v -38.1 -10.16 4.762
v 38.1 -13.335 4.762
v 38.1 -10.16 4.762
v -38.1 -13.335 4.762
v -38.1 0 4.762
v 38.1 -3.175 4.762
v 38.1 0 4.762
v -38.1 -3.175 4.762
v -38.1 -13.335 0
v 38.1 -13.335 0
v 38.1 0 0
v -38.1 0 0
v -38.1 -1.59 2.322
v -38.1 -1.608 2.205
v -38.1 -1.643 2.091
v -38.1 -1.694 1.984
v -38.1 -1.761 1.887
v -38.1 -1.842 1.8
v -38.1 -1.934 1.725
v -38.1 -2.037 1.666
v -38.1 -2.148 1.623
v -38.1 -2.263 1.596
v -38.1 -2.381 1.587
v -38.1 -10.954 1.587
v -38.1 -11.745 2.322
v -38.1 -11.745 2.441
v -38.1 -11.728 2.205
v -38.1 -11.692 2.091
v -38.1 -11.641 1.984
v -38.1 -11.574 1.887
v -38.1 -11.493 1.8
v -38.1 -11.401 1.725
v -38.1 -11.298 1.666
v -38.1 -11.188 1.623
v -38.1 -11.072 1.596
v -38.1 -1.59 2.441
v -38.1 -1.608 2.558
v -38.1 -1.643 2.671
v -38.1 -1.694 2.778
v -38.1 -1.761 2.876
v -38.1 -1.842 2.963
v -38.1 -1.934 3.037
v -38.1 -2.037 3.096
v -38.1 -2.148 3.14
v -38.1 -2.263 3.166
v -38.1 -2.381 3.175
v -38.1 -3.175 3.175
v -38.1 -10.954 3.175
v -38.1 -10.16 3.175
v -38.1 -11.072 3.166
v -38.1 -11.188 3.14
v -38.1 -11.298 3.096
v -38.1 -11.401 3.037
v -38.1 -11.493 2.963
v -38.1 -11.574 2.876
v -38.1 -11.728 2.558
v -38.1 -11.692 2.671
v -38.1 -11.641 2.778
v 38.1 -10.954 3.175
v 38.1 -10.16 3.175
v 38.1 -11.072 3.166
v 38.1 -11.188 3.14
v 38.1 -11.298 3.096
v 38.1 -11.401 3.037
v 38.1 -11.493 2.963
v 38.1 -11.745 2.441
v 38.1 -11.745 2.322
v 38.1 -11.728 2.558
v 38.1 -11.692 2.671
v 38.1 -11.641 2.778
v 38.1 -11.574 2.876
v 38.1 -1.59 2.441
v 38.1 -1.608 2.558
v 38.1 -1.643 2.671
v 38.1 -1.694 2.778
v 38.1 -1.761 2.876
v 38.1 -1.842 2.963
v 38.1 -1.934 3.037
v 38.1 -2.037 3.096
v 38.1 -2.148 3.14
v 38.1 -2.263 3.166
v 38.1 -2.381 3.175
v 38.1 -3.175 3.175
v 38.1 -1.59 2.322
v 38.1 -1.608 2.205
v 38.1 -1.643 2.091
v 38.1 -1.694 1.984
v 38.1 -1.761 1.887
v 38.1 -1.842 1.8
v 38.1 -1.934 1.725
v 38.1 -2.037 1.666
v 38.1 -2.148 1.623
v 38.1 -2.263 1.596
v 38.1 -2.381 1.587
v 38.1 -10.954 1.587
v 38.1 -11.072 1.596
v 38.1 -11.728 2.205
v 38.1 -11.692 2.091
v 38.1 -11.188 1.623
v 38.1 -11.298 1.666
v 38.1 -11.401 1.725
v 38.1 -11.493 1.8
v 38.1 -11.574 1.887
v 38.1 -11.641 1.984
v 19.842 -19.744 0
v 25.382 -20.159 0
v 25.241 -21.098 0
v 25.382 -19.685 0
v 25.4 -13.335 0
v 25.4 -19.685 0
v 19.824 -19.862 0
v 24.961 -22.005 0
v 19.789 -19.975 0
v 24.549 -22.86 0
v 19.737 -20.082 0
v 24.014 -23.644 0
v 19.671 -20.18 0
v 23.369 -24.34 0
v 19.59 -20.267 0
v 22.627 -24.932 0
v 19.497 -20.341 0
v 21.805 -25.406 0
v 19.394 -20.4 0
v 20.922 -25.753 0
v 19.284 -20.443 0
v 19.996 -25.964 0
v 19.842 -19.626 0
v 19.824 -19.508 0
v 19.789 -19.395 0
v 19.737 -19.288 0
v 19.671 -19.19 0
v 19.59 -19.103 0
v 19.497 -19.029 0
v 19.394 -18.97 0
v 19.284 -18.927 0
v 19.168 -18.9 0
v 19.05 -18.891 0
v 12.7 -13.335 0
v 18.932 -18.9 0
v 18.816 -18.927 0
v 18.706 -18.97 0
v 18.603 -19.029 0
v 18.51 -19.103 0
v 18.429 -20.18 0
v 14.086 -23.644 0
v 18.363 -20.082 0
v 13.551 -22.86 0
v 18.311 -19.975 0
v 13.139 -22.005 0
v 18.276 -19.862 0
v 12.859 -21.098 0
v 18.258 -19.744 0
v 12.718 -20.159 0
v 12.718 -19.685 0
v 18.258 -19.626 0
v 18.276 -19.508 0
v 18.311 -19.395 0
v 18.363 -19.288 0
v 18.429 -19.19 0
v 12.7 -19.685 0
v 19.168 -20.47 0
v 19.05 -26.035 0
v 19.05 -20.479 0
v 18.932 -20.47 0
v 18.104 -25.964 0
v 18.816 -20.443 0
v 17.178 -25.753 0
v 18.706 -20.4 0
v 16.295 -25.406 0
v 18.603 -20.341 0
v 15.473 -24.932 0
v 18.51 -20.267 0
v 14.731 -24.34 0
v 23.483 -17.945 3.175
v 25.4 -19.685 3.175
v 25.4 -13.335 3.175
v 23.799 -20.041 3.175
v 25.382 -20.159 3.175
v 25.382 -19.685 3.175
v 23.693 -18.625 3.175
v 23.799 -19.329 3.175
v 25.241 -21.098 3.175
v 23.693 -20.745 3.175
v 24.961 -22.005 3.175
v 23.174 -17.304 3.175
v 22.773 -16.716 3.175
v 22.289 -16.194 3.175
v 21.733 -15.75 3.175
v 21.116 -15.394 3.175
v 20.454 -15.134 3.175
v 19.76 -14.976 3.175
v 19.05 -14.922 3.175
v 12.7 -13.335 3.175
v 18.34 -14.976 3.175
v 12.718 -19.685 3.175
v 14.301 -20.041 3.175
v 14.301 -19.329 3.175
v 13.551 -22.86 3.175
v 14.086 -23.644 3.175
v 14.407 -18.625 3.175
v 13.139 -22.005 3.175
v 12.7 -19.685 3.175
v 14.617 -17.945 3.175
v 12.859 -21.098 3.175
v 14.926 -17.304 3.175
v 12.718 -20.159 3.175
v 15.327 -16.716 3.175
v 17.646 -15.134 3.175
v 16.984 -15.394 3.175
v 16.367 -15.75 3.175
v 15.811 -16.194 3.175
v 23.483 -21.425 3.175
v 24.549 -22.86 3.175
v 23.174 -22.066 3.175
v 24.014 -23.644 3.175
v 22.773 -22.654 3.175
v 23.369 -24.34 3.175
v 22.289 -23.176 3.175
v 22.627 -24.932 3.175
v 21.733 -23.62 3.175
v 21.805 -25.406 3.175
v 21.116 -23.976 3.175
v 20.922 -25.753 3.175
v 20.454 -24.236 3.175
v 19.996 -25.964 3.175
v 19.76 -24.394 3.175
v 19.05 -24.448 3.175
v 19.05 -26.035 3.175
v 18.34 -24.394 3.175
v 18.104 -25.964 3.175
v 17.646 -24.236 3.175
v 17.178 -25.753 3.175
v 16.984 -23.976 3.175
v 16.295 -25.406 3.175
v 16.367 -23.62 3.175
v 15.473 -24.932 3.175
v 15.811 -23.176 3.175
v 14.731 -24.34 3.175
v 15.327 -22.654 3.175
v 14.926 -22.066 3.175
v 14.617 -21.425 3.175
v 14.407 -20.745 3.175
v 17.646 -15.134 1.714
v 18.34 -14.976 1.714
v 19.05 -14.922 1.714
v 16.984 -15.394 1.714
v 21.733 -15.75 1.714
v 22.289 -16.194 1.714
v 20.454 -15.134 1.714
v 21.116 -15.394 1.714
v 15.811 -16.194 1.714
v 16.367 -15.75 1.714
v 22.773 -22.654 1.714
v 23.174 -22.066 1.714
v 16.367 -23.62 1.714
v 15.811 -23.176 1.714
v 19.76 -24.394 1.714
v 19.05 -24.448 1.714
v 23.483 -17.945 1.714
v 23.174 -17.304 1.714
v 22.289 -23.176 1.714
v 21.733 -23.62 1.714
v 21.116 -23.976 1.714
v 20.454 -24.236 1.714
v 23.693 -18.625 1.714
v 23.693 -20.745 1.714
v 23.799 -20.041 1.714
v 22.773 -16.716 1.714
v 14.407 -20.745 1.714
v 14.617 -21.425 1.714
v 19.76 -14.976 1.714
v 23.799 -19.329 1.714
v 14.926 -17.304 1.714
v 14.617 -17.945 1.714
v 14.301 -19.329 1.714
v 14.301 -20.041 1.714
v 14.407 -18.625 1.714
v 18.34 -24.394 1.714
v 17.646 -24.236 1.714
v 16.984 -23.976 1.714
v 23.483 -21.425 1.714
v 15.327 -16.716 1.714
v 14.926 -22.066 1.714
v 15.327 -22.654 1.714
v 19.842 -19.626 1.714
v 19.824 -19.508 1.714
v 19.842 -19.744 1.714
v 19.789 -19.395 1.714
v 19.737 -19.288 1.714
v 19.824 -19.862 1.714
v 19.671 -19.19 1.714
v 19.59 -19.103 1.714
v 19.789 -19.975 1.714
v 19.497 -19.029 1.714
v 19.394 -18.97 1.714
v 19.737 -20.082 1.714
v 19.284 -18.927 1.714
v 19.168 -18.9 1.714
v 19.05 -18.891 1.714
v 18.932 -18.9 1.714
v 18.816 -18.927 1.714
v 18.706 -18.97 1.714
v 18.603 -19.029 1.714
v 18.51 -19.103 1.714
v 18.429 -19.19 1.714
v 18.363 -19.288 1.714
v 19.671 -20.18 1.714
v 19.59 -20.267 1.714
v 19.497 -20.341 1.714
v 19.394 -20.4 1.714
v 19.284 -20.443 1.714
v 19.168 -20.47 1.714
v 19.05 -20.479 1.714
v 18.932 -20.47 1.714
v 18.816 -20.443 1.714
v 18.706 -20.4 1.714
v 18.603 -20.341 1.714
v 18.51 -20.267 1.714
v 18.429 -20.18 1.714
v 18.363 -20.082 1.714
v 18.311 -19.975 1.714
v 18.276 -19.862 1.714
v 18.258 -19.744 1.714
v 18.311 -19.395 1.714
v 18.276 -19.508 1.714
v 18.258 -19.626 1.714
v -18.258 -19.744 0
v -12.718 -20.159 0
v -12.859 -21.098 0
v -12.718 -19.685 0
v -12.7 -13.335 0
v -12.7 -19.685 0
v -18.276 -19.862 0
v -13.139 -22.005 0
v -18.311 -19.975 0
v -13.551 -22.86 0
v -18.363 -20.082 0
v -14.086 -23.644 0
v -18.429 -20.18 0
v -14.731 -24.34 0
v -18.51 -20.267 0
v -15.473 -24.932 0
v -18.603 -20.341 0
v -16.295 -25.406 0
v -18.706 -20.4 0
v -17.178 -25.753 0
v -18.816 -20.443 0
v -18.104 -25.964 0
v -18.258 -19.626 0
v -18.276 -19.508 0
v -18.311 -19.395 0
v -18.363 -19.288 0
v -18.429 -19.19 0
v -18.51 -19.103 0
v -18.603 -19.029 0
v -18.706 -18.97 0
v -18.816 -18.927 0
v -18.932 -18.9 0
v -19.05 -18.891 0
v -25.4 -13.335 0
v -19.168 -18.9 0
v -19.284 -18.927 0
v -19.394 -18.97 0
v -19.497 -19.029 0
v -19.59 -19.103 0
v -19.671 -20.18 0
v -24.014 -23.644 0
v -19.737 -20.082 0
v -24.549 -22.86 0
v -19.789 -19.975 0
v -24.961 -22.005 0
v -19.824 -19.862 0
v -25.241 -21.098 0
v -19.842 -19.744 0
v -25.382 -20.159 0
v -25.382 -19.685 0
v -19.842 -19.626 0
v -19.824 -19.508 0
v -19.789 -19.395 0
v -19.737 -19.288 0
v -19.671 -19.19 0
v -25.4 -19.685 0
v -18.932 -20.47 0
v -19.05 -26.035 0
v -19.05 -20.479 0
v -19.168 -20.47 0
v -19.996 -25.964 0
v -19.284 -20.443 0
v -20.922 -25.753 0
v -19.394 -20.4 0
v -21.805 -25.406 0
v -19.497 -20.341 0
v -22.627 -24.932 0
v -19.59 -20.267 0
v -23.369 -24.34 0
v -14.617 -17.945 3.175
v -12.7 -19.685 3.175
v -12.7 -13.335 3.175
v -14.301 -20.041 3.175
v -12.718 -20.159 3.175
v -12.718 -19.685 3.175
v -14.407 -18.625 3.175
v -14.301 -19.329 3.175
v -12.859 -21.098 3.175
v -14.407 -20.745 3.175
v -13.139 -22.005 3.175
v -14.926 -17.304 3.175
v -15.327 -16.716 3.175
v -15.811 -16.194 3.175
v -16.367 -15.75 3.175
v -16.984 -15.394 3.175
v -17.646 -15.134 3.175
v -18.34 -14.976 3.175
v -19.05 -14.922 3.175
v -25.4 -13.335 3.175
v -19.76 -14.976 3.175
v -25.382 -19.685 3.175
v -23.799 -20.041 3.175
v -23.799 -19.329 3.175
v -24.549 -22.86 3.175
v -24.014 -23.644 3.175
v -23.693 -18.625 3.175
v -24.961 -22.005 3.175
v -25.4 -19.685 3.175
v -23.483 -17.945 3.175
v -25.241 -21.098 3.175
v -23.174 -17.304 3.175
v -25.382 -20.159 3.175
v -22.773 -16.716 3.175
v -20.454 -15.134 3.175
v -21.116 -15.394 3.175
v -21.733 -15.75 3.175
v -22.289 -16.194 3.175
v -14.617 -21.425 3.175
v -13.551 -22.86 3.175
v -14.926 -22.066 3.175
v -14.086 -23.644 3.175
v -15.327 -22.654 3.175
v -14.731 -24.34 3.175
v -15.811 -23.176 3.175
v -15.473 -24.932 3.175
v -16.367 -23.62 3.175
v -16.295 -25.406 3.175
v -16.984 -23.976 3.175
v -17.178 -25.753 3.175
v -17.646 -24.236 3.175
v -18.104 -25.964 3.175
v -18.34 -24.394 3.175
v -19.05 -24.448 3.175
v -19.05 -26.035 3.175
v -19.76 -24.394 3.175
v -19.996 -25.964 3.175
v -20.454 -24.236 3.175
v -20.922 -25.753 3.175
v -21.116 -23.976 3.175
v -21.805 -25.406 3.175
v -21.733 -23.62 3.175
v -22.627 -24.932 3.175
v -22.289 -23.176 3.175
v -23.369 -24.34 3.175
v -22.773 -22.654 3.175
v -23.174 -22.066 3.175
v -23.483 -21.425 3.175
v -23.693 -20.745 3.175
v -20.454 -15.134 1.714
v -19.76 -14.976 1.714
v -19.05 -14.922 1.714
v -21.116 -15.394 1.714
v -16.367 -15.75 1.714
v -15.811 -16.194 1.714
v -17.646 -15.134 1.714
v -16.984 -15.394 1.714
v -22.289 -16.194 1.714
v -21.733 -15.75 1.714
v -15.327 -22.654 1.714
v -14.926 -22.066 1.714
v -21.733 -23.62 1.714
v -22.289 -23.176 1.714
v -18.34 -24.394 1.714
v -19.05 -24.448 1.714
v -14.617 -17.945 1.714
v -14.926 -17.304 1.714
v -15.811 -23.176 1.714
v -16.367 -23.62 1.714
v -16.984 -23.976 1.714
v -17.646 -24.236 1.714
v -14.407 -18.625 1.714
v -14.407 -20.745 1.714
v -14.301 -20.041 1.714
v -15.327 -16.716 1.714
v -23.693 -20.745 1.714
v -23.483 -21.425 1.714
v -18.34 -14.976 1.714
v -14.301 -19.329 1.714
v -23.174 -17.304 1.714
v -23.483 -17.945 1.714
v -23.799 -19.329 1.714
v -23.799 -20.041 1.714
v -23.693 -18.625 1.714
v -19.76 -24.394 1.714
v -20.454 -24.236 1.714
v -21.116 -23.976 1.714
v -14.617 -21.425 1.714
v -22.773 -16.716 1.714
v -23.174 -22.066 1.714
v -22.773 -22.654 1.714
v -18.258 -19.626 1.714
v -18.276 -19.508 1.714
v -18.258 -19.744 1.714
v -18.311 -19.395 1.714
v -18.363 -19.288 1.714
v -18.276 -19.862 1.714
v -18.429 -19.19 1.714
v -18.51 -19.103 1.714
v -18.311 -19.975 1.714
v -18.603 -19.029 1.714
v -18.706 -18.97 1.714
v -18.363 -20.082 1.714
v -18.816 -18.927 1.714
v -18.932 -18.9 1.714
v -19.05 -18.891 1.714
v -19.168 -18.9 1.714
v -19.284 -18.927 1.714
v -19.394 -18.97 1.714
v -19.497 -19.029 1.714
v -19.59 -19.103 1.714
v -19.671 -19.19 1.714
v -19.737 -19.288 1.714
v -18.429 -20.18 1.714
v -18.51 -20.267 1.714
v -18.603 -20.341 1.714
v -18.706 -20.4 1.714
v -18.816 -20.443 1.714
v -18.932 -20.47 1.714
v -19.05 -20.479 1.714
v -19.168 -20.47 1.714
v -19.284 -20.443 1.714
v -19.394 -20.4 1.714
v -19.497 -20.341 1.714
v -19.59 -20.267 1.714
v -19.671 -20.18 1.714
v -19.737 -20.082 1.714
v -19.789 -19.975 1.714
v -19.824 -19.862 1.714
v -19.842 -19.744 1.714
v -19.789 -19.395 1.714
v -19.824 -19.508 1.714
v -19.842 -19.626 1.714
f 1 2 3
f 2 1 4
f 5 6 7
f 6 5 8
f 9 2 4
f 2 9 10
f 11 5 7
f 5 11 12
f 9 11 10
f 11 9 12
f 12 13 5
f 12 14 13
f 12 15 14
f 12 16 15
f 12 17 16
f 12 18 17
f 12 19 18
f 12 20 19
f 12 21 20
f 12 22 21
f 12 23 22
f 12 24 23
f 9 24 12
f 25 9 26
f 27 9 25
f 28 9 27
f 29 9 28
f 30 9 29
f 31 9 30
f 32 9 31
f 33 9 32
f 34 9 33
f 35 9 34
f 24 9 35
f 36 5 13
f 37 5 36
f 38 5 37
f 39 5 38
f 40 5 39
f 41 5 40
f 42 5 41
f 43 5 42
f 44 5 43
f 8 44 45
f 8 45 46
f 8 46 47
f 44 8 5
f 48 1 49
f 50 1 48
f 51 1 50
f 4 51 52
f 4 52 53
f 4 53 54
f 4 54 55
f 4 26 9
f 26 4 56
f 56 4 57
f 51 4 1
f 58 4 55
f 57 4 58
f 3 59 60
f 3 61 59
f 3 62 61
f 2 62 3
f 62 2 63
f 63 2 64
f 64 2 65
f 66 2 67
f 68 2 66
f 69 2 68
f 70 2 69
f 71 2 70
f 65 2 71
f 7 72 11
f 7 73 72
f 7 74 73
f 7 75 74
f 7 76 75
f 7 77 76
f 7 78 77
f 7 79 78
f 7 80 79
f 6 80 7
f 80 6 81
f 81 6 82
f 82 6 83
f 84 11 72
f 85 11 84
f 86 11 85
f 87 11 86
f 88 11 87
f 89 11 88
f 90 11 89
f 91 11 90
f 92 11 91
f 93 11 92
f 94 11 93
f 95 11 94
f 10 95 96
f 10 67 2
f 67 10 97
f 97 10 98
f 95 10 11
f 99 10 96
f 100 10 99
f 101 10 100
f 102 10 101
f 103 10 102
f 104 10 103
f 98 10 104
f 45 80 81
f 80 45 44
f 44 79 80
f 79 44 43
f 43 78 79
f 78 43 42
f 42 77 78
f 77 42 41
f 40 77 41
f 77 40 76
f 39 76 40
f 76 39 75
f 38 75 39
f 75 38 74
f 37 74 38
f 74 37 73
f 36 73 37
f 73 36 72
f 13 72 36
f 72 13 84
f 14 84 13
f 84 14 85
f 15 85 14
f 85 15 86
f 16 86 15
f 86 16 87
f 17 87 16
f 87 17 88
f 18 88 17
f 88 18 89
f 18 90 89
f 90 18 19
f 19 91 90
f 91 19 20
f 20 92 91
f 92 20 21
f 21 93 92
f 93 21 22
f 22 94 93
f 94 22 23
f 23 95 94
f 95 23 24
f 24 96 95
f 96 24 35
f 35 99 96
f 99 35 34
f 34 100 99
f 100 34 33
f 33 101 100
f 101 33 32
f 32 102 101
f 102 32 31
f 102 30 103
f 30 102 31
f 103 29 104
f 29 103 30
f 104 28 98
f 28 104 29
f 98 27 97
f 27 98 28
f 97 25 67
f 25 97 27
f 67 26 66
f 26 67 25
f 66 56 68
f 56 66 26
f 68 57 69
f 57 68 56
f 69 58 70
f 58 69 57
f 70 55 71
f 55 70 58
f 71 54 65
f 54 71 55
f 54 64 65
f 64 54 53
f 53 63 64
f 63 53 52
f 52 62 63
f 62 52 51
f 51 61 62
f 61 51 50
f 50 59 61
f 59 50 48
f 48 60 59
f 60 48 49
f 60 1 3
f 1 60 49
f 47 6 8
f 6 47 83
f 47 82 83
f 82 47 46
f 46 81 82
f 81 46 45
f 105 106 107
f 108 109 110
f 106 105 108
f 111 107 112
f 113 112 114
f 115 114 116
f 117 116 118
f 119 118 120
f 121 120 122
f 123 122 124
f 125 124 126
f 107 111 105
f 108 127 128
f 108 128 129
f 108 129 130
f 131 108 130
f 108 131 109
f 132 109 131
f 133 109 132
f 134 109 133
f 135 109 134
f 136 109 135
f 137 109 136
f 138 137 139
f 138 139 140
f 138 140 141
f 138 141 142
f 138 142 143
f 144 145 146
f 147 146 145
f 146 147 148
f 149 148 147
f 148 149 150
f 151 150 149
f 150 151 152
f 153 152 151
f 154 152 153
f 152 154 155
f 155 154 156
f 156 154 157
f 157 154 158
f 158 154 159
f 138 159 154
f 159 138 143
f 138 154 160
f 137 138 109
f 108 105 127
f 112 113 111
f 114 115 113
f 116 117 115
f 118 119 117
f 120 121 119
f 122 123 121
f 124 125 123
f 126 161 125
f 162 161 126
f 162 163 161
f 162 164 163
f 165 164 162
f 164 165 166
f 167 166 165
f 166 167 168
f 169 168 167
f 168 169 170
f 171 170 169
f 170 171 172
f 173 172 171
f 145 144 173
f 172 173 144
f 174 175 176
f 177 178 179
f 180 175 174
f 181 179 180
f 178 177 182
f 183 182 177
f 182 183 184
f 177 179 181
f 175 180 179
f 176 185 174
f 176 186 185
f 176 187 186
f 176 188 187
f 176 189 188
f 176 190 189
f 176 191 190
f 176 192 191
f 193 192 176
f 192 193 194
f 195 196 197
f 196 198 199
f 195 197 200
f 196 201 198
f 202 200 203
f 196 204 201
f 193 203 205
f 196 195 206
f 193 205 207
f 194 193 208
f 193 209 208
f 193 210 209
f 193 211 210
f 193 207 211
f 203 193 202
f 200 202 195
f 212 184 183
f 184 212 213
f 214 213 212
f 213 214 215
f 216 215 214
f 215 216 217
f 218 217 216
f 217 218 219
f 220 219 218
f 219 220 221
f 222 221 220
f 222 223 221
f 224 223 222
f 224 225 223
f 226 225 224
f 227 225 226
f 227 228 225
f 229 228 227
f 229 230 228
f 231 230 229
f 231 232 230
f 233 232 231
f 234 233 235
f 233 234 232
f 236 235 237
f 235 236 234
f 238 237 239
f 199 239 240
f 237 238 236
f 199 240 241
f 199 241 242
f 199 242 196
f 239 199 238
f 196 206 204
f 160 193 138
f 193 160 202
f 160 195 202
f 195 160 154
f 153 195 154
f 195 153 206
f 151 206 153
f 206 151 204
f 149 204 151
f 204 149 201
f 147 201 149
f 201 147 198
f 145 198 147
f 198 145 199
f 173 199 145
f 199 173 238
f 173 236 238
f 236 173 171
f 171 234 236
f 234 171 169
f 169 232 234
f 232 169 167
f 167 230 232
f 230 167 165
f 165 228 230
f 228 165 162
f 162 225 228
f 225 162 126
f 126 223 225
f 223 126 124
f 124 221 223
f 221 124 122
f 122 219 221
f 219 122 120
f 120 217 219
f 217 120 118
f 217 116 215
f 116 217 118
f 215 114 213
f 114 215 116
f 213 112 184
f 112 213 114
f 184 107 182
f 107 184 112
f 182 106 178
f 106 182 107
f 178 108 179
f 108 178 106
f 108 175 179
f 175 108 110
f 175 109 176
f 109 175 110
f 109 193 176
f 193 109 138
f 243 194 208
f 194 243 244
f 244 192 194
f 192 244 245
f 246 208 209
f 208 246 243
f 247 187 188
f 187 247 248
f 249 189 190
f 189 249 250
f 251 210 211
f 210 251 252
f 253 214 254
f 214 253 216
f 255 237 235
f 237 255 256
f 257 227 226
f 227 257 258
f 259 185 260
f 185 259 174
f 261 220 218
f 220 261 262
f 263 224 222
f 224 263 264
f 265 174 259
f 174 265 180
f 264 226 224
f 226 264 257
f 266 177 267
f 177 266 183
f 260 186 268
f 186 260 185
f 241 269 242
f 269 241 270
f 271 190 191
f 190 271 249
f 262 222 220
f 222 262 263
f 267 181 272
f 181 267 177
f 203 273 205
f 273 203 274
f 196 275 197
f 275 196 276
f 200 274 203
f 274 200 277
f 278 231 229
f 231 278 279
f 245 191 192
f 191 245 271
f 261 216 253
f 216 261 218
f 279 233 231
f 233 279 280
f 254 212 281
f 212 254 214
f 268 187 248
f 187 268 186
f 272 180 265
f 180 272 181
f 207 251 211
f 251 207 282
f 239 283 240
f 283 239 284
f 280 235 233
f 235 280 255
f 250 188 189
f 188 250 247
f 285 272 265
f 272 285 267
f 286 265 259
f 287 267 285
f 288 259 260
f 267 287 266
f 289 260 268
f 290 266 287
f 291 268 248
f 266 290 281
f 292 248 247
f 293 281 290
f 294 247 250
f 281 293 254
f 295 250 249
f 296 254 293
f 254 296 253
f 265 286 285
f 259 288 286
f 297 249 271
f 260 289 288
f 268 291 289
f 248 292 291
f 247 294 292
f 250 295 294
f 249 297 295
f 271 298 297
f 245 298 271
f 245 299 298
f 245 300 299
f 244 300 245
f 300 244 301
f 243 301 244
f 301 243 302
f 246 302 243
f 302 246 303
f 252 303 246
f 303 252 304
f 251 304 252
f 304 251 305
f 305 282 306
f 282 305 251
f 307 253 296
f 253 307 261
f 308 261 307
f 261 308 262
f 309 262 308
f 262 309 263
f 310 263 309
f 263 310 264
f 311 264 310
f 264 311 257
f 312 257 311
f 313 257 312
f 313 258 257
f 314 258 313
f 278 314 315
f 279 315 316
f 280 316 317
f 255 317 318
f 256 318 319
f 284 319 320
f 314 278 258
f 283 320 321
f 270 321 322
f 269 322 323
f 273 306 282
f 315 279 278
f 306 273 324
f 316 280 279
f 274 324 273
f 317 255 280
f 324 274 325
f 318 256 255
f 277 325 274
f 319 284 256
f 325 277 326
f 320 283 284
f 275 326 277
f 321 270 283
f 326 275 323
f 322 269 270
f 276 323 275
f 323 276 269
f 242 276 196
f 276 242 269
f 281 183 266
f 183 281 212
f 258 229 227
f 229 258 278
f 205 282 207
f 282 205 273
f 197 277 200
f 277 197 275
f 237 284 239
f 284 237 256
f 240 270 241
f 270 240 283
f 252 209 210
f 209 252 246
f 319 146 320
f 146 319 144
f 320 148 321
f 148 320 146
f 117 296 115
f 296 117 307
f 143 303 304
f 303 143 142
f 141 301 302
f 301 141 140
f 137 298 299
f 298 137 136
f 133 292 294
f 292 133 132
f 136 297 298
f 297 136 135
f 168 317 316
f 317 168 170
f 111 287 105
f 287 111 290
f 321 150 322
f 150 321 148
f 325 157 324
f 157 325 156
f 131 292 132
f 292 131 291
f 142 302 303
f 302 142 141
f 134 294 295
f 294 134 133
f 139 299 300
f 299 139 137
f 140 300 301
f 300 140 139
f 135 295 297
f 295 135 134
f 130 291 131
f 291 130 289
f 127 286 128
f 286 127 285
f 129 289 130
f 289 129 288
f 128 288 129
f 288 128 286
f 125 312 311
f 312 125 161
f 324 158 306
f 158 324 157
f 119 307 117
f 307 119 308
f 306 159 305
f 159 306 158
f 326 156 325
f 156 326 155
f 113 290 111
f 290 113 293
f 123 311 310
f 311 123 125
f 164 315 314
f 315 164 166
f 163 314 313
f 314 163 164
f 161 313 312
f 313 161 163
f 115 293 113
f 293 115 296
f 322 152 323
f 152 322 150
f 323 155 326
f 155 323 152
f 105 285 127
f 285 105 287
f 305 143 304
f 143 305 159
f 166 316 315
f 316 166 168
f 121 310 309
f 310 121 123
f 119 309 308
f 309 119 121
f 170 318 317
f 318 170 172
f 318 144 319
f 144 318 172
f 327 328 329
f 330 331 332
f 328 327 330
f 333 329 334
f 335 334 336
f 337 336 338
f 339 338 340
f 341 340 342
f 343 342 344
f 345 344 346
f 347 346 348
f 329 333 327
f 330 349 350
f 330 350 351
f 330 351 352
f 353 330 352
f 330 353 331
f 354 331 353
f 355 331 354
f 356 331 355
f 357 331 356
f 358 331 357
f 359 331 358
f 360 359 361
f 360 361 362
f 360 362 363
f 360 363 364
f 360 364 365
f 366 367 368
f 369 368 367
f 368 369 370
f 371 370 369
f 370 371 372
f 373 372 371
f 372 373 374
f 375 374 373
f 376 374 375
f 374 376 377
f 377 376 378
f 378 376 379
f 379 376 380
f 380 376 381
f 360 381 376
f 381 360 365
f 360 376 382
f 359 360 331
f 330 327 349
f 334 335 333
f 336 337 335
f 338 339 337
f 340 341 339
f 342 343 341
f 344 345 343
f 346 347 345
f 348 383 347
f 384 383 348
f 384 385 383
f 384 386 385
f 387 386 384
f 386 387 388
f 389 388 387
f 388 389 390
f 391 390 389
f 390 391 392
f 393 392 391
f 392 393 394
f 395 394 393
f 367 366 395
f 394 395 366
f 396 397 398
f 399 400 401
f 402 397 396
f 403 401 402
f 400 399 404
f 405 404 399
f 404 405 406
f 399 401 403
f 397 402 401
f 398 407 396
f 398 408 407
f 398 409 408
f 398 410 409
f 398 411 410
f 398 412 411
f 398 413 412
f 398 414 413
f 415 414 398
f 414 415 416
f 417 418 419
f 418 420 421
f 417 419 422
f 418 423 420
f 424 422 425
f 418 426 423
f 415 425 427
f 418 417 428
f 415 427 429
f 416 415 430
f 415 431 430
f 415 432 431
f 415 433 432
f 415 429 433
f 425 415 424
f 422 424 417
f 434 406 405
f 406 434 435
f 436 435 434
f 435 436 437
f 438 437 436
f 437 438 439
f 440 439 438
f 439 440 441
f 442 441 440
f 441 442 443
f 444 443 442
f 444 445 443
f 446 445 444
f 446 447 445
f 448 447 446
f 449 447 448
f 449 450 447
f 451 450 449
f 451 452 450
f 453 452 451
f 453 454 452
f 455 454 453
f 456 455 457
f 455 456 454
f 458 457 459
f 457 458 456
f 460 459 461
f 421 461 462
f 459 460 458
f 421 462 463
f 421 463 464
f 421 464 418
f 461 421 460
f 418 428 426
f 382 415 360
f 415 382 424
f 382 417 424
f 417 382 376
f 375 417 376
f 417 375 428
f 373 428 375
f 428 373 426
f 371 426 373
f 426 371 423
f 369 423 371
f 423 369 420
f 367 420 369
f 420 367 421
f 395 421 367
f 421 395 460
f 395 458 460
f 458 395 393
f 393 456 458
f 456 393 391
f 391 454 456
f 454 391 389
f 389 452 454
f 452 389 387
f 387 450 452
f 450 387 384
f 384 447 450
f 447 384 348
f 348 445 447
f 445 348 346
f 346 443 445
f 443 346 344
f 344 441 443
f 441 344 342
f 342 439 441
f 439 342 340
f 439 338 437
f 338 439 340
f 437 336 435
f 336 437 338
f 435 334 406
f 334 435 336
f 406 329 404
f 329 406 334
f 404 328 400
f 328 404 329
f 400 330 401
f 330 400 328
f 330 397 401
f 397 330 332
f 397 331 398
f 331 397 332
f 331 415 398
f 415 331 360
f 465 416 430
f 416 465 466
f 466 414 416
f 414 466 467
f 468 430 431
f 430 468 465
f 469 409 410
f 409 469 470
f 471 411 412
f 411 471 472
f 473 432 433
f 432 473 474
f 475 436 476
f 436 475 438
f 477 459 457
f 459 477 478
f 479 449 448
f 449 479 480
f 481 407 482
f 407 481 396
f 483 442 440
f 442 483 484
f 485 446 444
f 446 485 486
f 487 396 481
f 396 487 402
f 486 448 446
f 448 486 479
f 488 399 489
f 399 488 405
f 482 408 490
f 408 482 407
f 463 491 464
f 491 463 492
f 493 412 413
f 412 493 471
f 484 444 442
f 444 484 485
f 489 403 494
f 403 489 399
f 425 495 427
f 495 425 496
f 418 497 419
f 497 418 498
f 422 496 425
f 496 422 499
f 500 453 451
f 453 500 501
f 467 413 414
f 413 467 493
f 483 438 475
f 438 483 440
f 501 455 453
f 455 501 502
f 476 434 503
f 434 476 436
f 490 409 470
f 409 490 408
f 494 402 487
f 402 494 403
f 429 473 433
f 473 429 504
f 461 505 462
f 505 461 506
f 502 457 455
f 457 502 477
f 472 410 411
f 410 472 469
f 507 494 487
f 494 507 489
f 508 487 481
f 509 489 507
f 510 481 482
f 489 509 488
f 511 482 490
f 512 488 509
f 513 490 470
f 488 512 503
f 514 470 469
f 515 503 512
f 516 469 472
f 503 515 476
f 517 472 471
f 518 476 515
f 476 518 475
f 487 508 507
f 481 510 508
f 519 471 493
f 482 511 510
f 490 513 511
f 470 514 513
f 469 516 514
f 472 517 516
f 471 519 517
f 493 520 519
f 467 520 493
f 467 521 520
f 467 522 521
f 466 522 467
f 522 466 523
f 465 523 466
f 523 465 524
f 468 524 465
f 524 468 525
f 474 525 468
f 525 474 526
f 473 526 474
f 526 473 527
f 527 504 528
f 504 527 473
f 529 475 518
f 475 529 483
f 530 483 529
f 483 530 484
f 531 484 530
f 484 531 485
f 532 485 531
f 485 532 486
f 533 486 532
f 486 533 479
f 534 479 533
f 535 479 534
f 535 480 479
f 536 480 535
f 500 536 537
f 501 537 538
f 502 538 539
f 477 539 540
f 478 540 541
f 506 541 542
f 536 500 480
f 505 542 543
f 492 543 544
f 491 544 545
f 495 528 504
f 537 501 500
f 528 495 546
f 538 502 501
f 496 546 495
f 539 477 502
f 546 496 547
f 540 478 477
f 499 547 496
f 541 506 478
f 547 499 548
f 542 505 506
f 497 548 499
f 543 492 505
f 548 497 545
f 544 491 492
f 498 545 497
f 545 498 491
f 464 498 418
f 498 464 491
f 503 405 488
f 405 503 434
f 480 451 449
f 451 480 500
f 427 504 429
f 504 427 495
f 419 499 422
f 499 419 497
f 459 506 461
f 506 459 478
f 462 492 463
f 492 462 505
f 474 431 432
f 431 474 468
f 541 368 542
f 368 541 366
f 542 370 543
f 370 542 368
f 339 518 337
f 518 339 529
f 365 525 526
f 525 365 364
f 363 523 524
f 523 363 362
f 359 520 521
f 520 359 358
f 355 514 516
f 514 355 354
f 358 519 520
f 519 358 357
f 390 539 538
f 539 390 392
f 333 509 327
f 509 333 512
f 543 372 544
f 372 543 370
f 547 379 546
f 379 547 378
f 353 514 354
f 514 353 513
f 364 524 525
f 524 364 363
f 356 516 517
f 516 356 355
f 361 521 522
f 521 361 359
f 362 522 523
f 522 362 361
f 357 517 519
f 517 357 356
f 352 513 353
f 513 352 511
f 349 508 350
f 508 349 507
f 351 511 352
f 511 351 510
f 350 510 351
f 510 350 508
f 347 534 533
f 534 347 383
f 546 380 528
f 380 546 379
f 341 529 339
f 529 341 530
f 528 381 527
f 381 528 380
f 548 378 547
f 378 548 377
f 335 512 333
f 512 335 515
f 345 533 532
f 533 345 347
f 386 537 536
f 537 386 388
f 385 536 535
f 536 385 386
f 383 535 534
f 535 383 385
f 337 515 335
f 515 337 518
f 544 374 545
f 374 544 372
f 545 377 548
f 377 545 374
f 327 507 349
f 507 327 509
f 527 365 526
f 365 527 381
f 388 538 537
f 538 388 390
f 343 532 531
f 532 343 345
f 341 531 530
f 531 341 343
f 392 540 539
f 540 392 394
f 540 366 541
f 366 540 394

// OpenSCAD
//BEGIN CUSTOMIZER VARIABLES
/* [Slot] */

//thickness
thickness = .0625;

//strip_height
strip_height = .4;

//length
length = 3;

/* [Push Pin] */

//pin_width, the pointy end
pin_width = .0625;

//pin_outer_width, need to name better
pin_outer_width = .375;

//num_of_pins
num_of_pins = 2;//[1:3]

/* [Advanced] */
//if you don't want fillets turn this off
fillets = true;

/* [Unit adjustment] */
//Basically are you using american units or real units
units_entered = 25.4;//[1:mm, 10:cm, 1000:meter, 25.4:inch, 304.8:foot]

//default is mm for most printers
desired_units_for_output = 1;//[1:mm, .1:cm, 0.001:meter, 0.0393701:inch, 0.00328084:foot]

//END CUSTOMIZER VARIABLES

unit_conversion_factor = units_entered*desired_units_for_output;

module rail(){
	difference(){
		cube([thickness*3,length,strip_height+thickness*2]);
		translate([thickness*1.5,-.005,thickness*1.5]){
			rotate([-90,0,0]){
				linear_extrude(length+.01)
				{
					hull(){
						circle(thickness/2,$fn=42);
						translate([0,-strip_height+thickness]){
							circle(thickness/2,$fn=42);
						}
					}
					translate([thickness*.5,thickness*1.5-strip_height]){
						square([thickness+.01,strip_height-thickness*2]);
					}
				}
			}
		}
	}
}

module push_pin_spot(){
	translate([0,0,(pin_outer_width+thickness*2)/2]){
		rotate([0,90,0]){
			difference(){
				linear_extrude(thickness*2){
					translate([(pin_outer_width+thickness*2)/4,0]){
						square([(pin_outer_width+thickness*2)/2,pin_outer_width+thickness*2],center=true);
					}
					circle((pin_outer_width+thickness*2)/2,$fn=42);
				}
				translate([0,0,thickness+0.005]){
					linear_extrude(thickness+.01){
						circle(pin_outer_width/2,$fn=42);
					}
				}
				translate([0,0,-0.005]){
					linear_extrude(thickness*2+.01){
						circle(pin_width/2,$fn=42);
					}
				}
			}
		}
	}
}

scale(unit_conversion_factor){
	rotate([90,-90,0]){//for display purposes
		translate([0,-length/2,0]){
			rail();
		}
		if(num_of_pins%2==1){
			translate([0,0,strip_height+thickness*2]){
				push_pin_spot();
			}
			if(num_of_pins==3){
				translate([0,-length/2+pin_outer_width-thickness*2,strip_height+thickness*2]){
					push_pin_spot();
				}
				translate([0,length/2-pin_outer_width+thickness*2,strip_height+thickness*2]){
					push_pin_spot();
				}
			}
		}
		else{
			translate([0,-length/4,strip_height+thickness*2]){
				push_pin_spot();
			}
			translate([0,length/4,strip_height+thickness*2]){
				push_pin_spot();
			}
		}
	}
}
